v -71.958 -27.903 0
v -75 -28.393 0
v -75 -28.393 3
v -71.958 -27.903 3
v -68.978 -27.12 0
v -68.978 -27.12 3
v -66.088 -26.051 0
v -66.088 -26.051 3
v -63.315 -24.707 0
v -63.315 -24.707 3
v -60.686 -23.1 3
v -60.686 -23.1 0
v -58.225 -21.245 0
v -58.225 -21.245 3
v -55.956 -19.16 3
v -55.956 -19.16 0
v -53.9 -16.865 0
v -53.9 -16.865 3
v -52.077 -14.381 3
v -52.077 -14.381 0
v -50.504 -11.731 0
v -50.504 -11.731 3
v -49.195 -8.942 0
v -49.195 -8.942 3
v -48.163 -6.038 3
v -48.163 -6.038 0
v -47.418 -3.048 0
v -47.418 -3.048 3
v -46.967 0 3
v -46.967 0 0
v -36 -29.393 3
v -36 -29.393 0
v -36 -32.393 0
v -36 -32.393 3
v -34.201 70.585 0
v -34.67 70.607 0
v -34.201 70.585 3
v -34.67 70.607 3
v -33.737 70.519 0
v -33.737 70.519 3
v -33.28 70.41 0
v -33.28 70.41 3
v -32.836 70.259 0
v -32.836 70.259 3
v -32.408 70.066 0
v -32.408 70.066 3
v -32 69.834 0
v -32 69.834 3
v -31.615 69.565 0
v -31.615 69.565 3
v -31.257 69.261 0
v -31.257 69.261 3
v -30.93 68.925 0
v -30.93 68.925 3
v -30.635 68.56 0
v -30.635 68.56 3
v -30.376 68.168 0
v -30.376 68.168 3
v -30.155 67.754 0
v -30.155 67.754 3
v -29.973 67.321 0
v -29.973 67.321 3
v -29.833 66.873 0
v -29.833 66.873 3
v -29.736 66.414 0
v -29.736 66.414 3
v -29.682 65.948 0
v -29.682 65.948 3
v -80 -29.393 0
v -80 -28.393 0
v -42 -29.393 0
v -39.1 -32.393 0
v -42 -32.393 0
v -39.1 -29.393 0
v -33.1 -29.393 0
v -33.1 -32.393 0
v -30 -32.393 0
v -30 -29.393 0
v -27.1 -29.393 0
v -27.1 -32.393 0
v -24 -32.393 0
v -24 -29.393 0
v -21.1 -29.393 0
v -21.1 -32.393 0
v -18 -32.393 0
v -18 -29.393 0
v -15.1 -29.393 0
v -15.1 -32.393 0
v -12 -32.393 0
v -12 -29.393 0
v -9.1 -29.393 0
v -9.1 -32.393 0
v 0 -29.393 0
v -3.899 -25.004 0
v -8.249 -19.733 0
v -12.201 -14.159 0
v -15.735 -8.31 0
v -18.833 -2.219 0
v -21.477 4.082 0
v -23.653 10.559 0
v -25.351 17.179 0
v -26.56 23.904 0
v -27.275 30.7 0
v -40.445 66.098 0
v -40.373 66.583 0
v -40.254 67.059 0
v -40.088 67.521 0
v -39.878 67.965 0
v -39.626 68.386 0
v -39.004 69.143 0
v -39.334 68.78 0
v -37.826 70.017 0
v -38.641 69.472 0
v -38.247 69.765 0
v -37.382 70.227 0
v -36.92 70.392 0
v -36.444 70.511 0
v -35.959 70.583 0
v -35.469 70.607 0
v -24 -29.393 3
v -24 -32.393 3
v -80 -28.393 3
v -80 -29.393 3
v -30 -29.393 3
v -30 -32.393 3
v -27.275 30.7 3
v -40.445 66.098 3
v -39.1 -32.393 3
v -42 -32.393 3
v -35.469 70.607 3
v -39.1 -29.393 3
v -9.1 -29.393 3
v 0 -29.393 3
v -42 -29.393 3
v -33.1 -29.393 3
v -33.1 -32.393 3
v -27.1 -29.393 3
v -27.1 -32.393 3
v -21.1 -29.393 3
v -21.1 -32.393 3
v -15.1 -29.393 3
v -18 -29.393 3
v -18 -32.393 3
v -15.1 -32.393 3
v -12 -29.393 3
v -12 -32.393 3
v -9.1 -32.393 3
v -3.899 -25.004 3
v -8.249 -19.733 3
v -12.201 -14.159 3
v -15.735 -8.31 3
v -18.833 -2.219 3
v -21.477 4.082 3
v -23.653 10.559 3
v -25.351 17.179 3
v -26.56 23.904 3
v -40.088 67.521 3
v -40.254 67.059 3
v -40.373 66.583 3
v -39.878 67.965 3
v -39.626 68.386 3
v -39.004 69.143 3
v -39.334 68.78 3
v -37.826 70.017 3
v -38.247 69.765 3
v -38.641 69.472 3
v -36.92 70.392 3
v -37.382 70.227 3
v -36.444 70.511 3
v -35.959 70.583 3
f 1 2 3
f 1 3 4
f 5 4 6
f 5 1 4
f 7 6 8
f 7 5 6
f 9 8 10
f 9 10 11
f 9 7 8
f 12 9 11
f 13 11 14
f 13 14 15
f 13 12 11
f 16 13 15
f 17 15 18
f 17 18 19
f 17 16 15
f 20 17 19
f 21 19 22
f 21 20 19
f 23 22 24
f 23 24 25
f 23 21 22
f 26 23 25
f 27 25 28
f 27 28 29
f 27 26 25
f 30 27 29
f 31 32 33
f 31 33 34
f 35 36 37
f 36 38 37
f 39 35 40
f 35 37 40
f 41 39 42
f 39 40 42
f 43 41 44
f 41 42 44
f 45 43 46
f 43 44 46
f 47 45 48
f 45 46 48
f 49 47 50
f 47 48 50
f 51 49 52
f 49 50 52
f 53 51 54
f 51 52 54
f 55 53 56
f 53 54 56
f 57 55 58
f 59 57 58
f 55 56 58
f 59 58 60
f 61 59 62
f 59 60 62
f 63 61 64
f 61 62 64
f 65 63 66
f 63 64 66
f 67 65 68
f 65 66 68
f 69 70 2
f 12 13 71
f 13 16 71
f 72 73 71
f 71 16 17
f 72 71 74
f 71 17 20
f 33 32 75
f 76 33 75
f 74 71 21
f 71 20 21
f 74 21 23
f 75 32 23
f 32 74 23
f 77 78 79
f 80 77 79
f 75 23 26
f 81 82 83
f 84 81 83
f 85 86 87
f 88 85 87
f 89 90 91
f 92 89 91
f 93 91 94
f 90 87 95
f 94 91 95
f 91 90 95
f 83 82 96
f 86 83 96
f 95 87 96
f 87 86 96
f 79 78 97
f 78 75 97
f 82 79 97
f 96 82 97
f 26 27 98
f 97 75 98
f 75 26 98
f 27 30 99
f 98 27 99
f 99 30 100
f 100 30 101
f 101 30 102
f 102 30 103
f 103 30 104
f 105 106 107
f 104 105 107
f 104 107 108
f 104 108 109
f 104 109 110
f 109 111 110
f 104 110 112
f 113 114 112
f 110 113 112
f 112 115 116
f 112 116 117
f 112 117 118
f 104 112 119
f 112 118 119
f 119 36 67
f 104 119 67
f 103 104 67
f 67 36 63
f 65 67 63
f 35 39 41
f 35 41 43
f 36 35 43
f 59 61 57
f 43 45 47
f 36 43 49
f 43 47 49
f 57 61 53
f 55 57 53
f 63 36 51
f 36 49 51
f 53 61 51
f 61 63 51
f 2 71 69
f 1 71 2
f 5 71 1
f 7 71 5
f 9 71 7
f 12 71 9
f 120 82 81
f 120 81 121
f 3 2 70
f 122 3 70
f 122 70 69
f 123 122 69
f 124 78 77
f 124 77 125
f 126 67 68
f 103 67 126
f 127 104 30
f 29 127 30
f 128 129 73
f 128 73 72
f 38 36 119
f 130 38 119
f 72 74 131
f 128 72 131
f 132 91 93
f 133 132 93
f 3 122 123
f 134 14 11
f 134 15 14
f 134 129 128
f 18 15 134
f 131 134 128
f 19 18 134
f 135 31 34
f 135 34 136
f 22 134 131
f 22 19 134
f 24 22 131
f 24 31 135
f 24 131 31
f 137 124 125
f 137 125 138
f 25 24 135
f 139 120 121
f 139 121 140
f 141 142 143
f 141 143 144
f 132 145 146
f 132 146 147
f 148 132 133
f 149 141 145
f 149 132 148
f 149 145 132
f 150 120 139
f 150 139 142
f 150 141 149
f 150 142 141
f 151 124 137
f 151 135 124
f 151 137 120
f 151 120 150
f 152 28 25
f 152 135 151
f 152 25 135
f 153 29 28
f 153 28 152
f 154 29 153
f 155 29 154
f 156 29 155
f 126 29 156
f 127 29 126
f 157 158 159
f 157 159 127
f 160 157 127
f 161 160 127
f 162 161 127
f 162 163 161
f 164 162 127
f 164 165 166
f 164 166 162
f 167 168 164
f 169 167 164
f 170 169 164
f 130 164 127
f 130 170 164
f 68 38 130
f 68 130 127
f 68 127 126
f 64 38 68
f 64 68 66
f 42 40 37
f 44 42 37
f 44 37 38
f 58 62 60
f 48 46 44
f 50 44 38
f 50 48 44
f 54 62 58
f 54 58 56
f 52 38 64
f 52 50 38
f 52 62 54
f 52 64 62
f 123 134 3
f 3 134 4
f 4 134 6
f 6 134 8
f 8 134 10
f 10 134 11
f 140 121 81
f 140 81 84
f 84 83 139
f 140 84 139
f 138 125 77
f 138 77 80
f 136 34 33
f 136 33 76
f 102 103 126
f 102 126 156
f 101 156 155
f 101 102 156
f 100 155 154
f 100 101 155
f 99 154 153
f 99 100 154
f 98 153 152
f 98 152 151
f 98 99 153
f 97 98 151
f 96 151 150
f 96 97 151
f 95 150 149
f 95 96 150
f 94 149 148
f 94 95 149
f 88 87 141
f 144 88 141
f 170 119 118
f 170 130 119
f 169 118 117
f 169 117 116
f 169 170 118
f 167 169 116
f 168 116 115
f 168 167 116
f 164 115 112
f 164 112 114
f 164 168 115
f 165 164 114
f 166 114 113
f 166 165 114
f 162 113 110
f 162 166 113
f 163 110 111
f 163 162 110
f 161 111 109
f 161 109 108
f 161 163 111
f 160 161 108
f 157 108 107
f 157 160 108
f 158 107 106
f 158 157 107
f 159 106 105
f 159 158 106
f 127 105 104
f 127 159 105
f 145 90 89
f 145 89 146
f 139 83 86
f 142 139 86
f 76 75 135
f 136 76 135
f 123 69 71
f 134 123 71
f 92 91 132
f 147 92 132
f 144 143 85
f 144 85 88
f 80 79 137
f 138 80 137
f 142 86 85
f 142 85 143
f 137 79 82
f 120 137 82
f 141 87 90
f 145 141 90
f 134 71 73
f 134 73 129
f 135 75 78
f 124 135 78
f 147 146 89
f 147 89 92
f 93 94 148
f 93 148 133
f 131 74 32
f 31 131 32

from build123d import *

# Parameters (mm, degrees)
PAD_DEPTH           = 3
FILLET_R            = 5
FILLET001_R         = 5
SKETCH001_W         = 2.9
SKETCH001_H         = 3
PAD001_DEPTH        = 3
LINEARPATTERN_COUNT = 6
LINEARPATTERN_PITCH = 6


with BuildPart() as part:
    # Sketch → Pad (new body)
    with BuildSketch(Plane.XY):
        with BuildLine():
            Line((-80, -29.392822), (0, -29.392822))
            Line((-3.899435, -25.004208), (0, -29.392822))
            ThreePointArc((-27.274722, 30.700125), (-20.212397, 0.907029), (-3.899435, -25.004208))
            Line((-30, 70.607178), (-27.274722, 30.700125))
            Line((-30, 70.607178), (-40, 70.607178))
            Line((-40, 70.607178), (-46.966643, 0))
            ThreePointArc((-75, -28.392822), (-55.956109, -19.159977), (-46.966643, 0))
            Line((-75, -28.392822), (-80, -28.392822))
            Line((-80, -28.392822), (-80, -29.392822))
        make_face()
    extrude(amount=PAD_DEPTH)

    # Fillet
    fillet_edges = [part.edges().sort_by_distance(p)[0] for p in [
        (-40, 70.607178, 1.5),
    ]]
    fillet(fillet_edges, radius=FILLET_R)

    # Fillet001
    fillet001_edges = [part.edges().sort_by_distance(p)[0] for p in [
        (-30, 70.607178, 1.5),
    ]]
    fillet(fillet001_edges, radius=FILLET001_R)

    # Sketch001 → Pad001 (new body)
    with BuildSketch(Plane.XZ.offset(29.392822)):
        with Locations((-40.55, 1.5)):
            Rectangle(SKETCH001_W, SKETCH001_H)
    pad001 = extrude(amount=PAD001_DEPTH)

    # LinearPattern: Pad001 ×6
    with Locations(*[(i * LINEARPATTERN_PITCH, 0, 0) for i in range(1, LINEARPATTERN_COUNT)]):
        add(pad001)


solid = part.part
